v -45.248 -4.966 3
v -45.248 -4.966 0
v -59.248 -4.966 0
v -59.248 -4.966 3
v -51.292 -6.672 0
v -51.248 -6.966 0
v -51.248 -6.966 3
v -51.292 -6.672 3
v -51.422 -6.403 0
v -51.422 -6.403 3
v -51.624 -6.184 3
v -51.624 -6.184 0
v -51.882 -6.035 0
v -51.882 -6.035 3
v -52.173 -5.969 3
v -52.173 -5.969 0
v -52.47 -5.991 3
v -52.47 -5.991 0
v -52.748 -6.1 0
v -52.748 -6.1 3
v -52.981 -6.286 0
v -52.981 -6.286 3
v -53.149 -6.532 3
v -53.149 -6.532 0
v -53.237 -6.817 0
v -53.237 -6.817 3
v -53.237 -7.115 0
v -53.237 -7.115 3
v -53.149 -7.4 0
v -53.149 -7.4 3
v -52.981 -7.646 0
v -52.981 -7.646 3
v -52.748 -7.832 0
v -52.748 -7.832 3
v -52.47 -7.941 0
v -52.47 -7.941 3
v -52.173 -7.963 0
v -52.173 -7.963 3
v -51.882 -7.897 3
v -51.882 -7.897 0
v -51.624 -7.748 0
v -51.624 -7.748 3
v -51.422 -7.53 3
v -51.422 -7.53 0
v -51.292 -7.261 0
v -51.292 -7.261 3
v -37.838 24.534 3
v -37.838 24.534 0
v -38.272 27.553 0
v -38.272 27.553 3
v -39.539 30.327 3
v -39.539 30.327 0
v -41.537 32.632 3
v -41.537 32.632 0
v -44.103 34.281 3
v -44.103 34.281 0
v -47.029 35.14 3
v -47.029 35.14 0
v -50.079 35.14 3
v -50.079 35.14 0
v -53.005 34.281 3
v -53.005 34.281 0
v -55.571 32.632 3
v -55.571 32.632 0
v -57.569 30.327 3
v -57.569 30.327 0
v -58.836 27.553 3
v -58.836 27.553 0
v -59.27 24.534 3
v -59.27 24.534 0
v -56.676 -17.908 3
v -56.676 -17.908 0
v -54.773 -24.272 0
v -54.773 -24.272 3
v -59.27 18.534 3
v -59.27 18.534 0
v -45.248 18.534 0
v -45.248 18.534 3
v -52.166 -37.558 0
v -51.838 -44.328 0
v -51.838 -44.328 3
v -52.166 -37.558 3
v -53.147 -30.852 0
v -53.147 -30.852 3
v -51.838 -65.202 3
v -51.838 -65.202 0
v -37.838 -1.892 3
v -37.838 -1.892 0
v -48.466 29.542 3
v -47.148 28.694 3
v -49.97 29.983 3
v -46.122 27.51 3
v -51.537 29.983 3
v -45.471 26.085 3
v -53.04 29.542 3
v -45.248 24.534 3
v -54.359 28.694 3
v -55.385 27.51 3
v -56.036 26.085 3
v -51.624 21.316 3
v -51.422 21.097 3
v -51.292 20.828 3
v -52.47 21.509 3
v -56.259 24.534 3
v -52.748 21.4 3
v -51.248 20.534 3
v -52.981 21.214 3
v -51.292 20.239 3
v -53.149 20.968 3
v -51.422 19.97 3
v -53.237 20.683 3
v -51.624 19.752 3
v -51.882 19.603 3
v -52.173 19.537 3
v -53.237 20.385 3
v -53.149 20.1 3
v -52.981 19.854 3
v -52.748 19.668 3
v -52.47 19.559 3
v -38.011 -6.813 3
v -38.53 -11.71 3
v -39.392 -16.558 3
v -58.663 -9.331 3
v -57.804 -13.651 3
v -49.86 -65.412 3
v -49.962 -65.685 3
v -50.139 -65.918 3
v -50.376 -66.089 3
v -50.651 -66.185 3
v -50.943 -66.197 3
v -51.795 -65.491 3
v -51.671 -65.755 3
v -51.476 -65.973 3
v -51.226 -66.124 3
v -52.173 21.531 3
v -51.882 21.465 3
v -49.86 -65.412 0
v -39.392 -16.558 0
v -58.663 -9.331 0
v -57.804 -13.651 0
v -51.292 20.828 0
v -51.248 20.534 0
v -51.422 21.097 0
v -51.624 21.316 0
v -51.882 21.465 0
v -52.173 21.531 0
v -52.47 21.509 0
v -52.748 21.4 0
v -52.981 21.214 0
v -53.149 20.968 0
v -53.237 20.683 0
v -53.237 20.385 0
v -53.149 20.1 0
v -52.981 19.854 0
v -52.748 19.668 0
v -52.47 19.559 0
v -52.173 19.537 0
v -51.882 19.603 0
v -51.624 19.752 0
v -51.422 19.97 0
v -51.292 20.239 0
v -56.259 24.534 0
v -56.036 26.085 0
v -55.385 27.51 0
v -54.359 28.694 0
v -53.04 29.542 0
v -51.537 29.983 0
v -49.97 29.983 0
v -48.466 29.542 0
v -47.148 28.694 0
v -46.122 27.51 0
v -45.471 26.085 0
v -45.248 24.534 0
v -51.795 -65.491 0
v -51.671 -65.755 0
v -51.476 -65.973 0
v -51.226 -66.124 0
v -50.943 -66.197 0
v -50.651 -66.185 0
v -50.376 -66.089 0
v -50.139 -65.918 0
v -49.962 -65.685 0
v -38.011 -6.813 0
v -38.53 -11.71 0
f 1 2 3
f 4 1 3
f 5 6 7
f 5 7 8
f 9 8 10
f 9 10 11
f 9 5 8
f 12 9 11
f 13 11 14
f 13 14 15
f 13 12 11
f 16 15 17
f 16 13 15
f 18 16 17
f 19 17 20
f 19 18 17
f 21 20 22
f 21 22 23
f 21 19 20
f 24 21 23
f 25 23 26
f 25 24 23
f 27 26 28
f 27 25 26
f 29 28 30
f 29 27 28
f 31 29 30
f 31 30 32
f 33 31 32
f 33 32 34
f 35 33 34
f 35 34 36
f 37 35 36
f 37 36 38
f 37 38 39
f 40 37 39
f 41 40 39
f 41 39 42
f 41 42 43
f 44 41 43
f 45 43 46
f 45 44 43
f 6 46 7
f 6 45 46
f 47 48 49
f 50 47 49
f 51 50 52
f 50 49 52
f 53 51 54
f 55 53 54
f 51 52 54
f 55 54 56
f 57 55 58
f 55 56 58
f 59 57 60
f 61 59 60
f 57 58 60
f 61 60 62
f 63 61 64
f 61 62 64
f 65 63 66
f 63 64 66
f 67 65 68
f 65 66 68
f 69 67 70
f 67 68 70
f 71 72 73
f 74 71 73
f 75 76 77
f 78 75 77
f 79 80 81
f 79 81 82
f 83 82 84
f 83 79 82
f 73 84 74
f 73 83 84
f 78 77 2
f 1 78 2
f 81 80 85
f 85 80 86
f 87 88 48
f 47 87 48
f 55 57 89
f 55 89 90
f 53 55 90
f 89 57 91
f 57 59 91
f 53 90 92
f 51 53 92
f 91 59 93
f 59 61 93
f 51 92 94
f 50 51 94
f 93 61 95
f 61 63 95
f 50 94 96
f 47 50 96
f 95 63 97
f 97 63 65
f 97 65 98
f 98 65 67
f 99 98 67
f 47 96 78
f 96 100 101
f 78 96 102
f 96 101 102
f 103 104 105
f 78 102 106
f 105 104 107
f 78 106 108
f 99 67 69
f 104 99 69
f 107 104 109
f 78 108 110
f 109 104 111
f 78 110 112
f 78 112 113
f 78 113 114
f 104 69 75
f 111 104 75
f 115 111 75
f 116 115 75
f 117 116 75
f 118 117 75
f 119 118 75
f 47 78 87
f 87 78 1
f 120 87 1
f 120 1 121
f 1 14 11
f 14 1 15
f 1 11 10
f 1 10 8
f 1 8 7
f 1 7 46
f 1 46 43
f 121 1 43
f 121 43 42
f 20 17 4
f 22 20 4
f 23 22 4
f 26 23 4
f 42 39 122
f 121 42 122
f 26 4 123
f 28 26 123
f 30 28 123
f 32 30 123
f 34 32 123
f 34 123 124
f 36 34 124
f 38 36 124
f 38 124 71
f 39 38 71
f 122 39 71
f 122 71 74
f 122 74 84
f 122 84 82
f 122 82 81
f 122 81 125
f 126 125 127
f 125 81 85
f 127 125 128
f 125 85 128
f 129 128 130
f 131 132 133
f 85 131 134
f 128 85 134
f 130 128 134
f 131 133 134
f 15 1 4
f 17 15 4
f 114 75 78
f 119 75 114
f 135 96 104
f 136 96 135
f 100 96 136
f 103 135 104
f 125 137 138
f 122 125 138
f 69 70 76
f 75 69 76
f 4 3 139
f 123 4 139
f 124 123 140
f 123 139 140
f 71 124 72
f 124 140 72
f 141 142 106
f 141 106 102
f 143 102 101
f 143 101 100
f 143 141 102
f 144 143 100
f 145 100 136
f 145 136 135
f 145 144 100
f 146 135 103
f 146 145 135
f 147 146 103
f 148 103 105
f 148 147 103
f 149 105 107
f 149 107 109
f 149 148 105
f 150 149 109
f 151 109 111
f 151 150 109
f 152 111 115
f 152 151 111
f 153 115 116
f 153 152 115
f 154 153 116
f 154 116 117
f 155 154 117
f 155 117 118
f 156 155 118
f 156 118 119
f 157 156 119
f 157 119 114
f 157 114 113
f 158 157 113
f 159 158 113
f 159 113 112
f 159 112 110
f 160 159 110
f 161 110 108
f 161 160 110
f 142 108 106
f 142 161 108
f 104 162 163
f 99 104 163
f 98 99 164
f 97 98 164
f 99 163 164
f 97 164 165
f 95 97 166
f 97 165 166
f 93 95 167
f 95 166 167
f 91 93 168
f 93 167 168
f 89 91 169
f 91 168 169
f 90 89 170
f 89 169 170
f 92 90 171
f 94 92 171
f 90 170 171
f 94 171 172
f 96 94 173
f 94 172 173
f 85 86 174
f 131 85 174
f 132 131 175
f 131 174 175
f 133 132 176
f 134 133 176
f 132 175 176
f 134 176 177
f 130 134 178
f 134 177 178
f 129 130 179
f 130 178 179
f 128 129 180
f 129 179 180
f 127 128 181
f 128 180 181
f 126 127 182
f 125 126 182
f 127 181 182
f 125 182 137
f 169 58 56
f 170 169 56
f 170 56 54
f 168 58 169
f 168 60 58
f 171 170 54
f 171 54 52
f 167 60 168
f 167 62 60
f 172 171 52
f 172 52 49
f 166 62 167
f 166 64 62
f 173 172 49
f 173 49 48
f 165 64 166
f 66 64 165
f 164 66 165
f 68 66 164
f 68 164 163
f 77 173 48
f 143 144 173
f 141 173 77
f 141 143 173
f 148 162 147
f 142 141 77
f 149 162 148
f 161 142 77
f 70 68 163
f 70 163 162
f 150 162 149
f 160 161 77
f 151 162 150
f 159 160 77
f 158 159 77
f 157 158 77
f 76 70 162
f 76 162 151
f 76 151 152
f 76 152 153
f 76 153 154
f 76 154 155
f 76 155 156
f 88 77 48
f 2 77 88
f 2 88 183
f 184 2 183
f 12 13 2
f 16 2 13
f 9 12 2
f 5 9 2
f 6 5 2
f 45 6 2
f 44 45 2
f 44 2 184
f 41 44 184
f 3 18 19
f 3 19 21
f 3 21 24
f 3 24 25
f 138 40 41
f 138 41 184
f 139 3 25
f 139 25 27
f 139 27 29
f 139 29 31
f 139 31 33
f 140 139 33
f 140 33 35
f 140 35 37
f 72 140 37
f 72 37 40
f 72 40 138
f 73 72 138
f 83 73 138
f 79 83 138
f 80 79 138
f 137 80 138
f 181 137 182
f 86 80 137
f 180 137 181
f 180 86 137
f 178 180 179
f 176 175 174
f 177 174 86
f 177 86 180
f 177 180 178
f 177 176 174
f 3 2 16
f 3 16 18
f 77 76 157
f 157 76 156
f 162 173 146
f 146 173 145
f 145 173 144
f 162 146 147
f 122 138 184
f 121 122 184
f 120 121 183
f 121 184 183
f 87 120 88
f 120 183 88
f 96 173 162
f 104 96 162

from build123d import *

# Parameters (mm, degrees)
SKETCH1_R           = 1
BOSS_EXTRUDE1_DEPTH = 3
FILLET_2_R          = 70


with BuildPart() as part:
    # Sketch1 → Boss-Extrude1 (new body)
    with BuildSketch(Plane.XY):
        with BuildLine():
            Line((-59.269719731, 24.533720681), (-59.269719731, 18.533720681))
            Line((-59.269719731, 18.533720681), (-45.247809755, 18.533720681))
            Line((-45.247809755, 18.533720681), (-45.247809755, -4.966279319))
            Line((-45.247809755, -4.966279319), (-59.247809755, -4.966279319))
            Line((-59.247809755, -4.966279319), (-59.247809755, -9.307077777))
            Line((-59.247809755, -9.307077777), (-51.83788451, -34.085396001))
            Line((-51.83788451, -34.085396001), (-51.83788451, -65.202303041))
            ThreePointArc((-51.83788451, -65.202303041), (-50.943230184, -66.196738704), (-49.860079932, -65.411822033))
            Line((-49.860079932, -65.411822033), (-37.838240661, -9.307077777))
            Line((-37.838240661, -9.307077777), (-37.838240661, 24.533720681))
            ThreePointArc((-37.838240661, 24.533720681), (-48.553980196, 35.249460216), (-59.269719731, 24.533720681))
        make_face()
        with Locations((-52.247809755, 20.533720681)):
            Circle(SKETCH1_R, mode=Mode.SUBTRACT)
        with Locations((-52.247809755, -6.966279319)):
            Circle(SKETCH1_R, mode=Mode.SUBTRACT)
        with BuildLine():
            Line((-45.247809755, 24.533720681), (-56.258764743, 24.533720681))
            ThreePointArc((-56.258764743, 24.533720681), (-50.753287249, 30.039198175), (-45.247809755, 24.533720681))
        make_face(mode=Mode.SUBTRACT)
    extrude(amount=BOSS_EXTRUDE1_DEPTH)

    # Скругление2
    # the kernel refuses this fillet: 70 mm, written as the material it adds along each edge
    with BuildSketch(Plane(origin=(-51.83788451, -34.085396001, 0), x_dir=(-0.28651166180092774, 0.9580767545724459, 0), z_dir=(0, 0, 1))) as fillet_2_piece_1:
        with BuildLine():
            CenterArc((FILLET_2_R * 0.146322998387, FILLET_2_R), FILLET_2_R, 253.350770917, 16.649229083)
            Line((-FILLET_2_R * 0.140188663414, FILLET_2_R * 0.0419232454276), (0, 0))
            Line((0, 0), (FILLET_2_R * 0.146322998387, 0))
        make_face()
    extrude(amount=3)
    # the kernel refuses this fillet: 70 mm, written as the material it takes off along each edge
    with BuildSketch(Plane(origin=(-59.247809755, -9.307077777, -22.444406255), x_dir=(0, 1, 0), z_dir=(0, 0, 1))) as fillet_2_2_piece_1:
        with BuildLine():
            CenterArc((11.454430765, -69.637606474), FILLET_2_R, 95.832656056, 10.816573027)
            Line((-8.601385561, -2.572233654), (0, 0))
            Line((0, 0), (4.340798458, 0))
        make_face()
    extrude(amount=47.88881251, mode=Mode.SUBTRACT)
    with BuildSketch(Plane(origin=(-37.838240661, -9.307077777, -18.538648377), x_dir=(0, 1, 0), z_dir=(0, 0, 1))) as fillet_2_2_piece_2:
        with BuildLine():
            CenterArc((FILLET_2_R * 0.10593513358, FILLET_2_R), FILLET_2_R, 257.905834548, 12.094165452)
            Line((-FILLET_2_R * 0.103583858541, FILLET_2_R * 0.0221954224179), (0, 0))
            Line((0, 0), (FILLET_2_R * 0.10593513358, 0))
        make_face()
    extrude(amount=40.077296753, mode=Mode.SUBTRACT)


solid = part.part
